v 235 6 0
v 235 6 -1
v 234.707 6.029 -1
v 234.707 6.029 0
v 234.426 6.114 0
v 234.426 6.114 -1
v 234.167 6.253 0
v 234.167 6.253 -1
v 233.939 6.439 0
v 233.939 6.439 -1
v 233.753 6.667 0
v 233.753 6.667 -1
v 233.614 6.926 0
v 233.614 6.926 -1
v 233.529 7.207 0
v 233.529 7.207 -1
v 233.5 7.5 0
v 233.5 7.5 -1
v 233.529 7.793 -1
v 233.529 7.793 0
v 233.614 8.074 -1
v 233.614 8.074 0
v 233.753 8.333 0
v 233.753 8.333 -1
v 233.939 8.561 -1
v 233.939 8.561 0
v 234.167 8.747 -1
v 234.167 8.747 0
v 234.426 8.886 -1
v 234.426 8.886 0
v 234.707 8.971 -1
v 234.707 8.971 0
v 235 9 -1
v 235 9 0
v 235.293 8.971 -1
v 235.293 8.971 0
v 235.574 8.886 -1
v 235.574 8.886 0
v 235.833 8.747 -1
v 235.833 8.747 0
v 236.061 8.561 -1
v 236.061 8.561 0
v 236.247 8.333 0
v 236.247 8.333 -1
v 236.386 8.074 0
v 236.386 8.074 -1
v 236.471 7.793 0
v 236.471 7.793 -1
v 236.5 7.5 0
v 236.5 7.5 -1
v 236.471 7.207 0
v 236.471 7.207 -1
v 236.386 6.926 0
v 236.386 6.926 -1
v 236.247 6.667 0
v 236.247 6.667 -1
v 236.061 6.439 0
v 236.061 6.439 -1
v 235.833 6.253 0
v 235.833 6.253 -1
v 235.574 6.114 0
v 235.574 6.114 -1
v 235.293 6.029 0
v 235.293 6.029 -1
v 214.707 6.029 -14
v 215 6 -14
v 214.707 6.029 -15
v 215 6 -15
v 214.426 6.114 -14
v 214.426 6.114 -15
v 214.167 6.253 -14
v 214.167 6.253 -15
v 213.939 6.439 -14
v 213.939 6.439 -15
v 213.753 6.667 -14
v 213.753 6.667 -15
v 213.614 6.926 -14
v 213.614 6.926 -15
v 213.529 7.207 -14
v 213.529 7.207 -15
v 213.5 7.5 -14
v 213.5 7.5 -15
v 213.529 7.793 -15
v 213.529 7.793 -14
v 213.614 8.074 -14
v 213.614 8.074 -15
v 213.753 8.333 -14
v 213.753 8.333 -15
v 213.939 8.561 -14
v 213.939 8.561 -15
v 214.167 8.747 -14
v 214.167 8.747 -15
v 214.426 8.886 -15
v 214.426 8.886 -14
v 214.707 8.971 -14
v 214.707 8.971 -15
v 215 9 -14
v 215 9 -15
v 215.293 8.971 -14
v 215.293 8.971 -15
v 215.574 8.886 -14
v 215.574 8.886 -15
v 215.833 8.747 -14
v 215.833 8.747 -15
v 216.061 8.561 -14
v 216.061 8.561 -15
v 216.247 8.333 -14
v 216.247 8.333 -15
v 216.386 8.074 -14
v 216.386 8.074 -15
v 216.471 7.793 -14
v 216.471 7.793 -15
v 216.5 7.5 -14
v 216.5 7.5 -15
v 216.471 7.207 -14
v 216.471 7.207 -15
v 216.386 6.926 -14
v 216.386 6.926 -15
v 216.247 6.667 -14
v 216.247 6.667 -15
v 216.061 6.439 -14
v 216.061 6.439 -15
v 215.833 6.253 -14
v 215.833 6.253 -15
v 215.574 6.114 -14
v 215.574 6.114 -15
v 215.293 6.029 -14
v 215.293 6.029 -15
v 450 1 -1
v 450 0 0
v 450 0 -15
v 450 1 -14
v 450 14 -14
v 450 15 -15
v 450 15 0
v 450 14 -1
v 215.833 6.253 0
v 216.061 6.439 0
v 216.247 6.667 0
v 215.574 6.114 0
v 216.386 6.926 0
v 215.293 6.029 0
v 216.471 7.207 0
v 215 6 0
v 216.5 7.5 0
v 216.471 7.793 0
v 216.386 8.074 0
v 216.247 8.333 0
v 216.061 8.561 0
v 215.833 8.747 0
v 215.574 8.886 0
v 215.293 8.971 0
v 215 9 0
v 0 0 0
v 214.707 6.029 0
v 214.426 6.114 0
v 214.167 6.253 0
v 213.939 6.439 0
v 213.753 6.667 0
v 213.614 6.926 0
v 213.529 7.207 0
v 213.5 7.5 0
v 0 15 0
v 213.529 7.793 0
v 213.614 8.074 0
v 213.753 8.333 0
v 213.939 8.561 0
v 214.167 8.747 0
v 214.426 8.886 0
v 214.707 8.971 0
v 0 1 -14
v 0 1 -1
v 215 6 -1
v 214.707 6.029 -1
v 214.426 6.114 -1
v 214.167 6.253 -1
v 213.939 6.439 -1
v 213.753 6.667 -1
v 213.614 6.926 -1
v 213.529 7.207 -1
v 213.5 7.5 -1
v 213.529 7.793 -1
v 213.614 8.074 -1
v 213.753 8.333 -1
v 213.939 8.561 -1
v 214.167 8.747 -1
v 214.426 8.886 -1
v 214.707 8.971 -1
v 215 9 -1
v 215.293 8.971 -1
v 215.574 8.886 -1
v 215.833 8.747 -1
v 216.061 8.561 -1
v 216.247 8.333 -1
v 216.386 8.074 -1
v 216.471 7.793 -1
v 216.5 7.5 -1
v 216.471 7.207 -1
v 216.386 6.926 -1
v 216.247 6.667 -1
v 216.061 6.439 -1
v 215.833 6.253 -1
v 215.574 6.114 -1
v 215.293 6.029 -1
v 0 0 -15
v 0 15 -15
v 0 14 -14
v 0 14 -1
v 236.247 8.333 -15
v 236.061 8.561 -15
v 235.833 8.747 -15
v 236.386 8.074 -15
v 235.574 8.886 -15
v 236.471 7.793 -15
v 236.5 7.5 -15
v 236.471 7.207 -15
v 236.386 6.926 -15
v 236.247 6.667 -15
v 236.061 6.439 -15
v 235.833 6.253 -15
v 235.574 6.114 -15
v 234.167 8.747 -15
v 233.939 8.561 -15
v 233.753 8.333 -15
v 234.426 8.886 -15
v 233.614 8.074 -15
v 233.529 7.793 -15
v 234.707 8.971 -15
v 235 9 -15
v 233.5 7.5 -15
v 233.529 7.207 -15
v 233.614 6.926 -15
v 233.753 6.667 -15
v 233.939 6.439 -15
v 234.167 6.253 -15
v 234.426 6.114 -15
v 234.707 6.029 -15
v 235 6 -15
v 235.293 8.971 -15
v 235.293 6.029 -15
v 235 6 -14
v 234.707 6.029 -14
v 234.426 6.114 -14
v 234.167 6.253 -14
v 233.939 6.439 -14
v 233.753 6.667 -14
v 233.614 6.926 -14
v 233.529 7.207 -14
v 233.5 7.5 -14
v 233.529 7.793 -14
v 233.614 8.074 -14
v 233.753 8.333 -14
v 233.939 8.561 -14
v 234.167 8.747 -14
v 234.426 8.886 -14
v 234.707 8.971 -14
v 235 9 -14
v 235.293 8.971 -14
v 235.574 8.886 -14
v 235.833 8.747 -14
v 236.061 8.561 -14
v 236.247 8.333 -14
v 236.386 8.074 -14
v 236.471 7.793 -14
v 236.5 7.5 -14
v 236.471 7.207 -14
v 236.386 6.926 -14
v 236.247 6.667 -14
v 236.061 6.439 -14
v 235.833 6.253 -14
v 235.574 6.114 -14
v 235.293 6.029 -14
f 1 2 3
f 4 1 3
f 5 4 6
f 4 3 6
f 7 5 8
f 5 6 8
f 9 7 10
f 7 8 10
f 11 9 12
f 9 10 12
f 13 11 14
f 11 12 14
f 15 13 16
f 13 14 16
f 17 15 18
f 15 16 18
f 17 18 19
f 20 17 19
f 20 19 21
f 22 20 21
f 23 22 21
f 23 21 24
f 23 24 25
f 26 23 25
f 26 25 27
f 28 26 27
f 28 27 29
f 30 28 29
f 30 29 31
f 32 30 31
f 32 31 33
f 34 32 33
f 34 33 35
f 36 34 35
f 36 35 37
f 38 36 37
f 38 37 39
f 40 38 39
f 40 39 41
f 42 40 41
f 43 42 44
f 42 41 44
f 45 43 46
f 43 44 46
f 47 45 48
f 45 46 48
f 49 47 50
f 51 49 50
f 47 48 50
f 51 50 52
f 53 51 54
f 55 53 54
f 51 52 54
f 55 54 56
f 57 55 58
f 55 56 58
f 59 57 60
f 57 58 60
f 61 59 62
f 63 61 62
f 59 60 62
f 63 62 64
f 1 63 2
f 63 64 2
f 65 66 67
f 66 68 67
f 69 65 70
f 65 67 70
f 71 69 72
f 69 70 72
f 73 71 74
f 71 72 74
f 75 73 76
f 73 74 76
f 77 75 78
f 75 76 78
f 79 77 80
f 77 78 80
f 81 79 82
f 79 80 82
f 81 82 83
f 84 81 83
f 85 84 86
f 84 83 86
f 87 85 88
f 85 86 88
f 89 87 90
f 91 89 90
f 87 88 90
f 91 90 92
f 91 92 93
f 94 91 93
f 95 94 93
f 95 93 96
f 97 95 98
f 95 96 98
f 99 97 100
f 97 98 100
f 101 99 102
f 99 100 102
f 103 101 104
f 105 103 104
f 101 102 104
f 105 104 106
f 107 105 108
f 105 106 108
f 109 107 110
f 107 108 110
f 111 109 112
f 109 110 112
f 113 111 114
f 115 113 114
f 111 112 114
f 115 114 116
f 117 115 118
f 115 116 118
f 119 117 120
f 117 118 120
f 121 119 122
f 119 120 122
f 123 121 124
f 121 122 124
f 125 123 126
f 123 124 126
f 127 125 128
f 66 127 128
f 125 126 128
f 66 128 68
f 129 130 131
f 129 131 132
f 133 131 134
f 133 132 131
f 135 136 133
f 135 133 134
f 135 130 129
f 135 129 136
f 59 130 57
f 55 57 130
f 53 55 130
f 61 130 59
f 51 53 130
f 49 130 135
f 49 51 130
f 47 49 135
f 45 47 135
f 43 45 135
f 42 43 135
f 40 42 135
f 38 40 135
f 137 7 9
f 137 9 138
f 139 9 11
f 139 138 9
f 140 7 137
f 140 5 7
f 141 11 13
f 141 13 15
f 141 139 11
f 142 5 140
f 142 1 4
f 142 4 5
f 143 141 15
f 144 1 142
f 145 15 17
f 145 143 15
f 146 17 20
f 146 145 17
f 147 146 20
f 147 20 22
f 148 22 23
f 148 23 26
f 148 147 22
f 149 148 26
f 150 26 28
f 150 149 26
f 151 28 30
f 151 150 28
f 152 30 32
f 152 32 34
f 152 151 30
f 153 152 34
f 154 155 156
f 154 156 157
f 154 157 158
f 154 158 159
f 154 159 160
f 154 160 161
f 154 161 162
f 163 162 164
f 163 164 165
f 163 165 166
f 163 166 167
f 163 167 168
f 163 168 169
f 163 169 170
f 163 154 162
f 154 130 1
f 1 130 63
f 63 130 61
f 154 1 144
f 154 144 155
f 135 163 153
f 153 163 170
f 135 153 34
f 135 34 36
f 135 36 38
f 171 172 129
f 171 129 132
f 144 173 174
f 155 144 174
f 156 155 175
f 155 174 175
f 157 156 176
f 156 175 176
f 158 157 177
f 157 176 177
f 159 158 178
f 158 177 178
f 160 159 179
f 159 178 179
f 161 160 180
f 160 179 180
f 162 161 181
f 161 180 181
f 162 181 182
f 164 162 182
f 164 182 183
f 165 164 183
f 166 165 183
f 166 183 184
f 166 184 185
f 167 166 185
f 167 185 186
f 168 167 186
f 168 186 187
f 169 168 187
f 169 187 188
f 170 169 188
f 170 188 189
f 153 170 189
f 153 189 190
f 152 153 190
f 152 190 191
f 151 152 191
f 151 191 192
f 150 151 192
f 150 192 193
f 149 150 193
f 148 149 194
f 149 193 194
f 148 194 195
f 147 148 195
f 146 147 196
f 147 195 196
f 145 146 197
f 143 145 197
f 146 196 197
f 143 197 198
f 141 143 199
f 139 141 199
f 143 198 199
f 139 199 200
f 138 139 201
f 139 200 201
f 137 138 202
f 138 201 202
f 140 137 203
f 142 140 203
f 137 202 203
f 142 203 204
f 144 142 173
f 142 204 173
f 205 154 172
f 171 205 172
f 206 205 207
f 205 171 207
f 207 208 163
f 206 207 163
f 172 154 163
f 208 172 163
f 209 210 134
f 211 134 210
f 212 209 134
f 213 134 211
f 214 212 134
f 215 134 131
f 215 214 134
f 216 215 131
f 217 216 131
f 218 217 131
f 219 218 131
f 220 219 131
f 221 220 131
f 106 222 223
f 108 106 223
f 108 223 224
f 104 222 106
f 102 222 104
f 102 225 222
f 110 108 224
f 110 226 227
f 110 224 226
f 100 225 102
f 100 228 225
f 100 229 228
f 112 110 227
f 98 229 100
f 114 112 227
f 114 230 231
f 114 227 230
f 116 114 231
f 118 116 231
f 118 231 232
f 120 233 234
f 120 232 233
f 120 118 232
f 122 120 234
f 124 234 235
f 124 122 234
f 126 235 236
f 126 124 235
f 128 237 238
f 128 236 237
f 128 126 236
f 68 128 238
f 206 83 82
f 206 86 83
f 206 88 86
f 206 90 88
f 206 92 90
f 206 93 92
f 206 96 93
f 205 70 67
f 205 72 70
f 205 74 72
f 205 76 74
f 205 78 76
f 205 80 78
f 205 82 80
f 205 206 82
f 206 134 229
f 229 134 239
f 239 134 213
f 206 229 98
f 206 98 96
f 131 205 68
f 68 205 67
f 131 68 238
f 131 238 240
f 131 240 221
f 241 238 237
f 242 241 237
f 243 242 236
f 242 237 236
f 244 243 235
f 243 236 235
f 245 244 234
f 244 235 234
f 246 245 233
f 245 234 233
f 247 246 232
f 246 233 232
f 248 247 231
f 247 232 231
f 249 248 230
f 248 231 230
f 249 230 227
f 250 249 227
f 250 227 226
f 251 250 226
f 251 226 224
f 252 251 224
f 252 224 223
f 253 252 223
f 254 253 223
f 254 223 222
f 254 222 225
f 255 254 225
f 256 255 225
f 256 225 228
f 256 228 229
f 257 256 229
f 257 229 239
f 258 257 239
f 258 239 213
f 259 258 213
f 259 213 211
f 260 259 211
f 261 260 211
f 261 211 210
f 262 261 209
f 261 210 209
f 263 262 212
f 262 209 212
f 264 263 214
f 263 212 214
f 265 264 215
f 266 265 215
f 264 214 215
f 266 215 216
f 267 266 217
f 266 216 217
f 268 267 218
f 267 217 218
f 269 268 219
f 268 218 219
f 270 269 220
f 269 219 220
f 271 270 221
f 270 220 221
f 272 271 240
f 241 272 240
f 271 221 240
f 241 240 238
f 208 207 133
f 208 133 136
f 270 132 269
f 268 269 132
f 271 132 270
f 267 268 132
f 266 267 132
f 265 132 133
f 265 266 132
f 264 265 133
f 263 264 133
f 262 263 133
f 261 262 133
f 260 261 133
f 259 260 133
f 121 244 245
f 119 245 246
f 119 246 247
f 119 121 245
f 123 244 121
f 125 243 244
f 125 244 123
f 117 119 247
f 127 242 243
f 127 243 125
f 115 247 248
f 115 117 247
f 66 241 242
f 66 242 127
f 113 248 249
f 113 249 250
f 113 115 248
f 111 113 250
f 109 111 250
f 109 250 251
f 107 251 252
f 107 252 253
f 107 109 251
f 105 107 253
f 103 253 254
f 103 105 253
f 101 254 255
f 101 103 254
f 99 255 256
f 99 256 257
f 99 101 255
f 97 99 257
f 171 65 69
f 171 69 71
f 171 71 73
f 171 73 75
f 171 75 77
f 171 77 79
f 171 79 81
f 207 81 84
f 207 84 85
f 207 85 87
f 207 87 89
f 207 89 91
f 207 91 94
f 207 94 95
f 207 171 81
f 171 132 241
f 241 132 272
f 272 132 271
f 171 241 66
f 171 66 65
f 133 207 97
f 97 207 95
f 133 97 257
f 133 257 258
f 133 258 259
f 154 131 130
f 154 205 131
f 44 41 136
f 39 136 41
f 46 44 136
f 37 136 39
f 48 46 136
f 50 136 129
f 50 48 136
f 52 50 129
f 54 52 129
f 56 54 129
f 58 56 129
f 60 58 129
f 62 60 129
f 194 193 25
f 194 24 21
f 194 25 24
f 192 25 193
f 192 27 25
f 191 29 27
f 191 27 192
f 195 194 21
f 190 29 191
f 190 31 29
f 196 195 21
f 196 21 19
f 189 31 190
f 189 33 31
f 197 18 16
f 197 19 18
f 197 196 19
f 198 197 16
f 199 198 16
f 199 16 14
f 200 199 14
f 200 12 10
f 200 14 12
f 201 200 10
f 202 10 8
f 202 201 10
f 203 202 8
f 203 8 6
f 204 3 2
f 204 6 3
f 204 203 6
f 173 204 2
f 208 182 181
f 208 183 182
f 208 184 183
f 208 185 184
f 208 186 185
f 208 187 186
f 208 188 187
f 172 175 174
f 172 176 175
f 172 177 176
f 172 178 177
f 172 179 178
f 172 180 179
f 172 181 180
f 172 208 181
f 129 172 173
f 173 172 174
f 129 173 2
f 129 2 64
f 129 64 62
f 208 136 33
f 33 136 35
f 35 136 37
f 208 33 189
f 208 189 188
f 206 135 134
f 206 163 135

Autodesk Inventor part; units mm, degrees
ref_plane "YZ Plane" through (0, 0, 0) normal (1, 0, 0) x (0, 1, 0)
ref_plane "XZ Plane" through (0, 0, 0) normal (0, 1, 0) x (-1, 0, 0)
ref_plane "XY Plane" through (0, 0, 0) normal (0, 0, 1) x (1, 0, 0)
sketch "スケッチ1" plane through (0, 0, 0) normal (1, 0, 0) x (0, 1, 0)
  line L0 (0, 0) -> (15, 0)
  line L1 (15, 0) -> (15, -15)
  line L2 (15, -15) -> (0, -15)
  line L3 (0, -15) -> (0, 0)
  line L4 (14, -1) -> (1, -1)
  line L5 (1, -1) -> (1, -14)
  line L6 (1, -14) -> (14, -14)
  line L7 (14, -14) -> (14, -1)
  dimension "d0" = 15
  dimension "d1" = 15
  dimension "d2" = 1
extrude "押し出し1" add sketch "スケッチ1" along normal blind 450
sketch "スケッチ2" plane through (0, 0, 0) normal (0, 0, 1) x (1, 0, 0)
  line L0 (0, 15) -> (450, 15) projected
  line L1 (225, 15) -> (225, 0)
  line L2 (0, 15) -> (0, 0) projected
  point P0 (215, 7.5)
  point P1 (235, 7.5)
  dimension "d5" = 225
  dimension "d6" = 10
  dimension "d7" = 10
  dimension "d8" = 7.5
  dimension "d9" = 7.5
hole "穴1" at (215, 7.5, 0) at (235, 7.5, 0) direction (0, 0, -1) diameter 3 end through all
properties part number "hand-grab-v2-ASP-arm-support" material "アルミニウム 6061"
